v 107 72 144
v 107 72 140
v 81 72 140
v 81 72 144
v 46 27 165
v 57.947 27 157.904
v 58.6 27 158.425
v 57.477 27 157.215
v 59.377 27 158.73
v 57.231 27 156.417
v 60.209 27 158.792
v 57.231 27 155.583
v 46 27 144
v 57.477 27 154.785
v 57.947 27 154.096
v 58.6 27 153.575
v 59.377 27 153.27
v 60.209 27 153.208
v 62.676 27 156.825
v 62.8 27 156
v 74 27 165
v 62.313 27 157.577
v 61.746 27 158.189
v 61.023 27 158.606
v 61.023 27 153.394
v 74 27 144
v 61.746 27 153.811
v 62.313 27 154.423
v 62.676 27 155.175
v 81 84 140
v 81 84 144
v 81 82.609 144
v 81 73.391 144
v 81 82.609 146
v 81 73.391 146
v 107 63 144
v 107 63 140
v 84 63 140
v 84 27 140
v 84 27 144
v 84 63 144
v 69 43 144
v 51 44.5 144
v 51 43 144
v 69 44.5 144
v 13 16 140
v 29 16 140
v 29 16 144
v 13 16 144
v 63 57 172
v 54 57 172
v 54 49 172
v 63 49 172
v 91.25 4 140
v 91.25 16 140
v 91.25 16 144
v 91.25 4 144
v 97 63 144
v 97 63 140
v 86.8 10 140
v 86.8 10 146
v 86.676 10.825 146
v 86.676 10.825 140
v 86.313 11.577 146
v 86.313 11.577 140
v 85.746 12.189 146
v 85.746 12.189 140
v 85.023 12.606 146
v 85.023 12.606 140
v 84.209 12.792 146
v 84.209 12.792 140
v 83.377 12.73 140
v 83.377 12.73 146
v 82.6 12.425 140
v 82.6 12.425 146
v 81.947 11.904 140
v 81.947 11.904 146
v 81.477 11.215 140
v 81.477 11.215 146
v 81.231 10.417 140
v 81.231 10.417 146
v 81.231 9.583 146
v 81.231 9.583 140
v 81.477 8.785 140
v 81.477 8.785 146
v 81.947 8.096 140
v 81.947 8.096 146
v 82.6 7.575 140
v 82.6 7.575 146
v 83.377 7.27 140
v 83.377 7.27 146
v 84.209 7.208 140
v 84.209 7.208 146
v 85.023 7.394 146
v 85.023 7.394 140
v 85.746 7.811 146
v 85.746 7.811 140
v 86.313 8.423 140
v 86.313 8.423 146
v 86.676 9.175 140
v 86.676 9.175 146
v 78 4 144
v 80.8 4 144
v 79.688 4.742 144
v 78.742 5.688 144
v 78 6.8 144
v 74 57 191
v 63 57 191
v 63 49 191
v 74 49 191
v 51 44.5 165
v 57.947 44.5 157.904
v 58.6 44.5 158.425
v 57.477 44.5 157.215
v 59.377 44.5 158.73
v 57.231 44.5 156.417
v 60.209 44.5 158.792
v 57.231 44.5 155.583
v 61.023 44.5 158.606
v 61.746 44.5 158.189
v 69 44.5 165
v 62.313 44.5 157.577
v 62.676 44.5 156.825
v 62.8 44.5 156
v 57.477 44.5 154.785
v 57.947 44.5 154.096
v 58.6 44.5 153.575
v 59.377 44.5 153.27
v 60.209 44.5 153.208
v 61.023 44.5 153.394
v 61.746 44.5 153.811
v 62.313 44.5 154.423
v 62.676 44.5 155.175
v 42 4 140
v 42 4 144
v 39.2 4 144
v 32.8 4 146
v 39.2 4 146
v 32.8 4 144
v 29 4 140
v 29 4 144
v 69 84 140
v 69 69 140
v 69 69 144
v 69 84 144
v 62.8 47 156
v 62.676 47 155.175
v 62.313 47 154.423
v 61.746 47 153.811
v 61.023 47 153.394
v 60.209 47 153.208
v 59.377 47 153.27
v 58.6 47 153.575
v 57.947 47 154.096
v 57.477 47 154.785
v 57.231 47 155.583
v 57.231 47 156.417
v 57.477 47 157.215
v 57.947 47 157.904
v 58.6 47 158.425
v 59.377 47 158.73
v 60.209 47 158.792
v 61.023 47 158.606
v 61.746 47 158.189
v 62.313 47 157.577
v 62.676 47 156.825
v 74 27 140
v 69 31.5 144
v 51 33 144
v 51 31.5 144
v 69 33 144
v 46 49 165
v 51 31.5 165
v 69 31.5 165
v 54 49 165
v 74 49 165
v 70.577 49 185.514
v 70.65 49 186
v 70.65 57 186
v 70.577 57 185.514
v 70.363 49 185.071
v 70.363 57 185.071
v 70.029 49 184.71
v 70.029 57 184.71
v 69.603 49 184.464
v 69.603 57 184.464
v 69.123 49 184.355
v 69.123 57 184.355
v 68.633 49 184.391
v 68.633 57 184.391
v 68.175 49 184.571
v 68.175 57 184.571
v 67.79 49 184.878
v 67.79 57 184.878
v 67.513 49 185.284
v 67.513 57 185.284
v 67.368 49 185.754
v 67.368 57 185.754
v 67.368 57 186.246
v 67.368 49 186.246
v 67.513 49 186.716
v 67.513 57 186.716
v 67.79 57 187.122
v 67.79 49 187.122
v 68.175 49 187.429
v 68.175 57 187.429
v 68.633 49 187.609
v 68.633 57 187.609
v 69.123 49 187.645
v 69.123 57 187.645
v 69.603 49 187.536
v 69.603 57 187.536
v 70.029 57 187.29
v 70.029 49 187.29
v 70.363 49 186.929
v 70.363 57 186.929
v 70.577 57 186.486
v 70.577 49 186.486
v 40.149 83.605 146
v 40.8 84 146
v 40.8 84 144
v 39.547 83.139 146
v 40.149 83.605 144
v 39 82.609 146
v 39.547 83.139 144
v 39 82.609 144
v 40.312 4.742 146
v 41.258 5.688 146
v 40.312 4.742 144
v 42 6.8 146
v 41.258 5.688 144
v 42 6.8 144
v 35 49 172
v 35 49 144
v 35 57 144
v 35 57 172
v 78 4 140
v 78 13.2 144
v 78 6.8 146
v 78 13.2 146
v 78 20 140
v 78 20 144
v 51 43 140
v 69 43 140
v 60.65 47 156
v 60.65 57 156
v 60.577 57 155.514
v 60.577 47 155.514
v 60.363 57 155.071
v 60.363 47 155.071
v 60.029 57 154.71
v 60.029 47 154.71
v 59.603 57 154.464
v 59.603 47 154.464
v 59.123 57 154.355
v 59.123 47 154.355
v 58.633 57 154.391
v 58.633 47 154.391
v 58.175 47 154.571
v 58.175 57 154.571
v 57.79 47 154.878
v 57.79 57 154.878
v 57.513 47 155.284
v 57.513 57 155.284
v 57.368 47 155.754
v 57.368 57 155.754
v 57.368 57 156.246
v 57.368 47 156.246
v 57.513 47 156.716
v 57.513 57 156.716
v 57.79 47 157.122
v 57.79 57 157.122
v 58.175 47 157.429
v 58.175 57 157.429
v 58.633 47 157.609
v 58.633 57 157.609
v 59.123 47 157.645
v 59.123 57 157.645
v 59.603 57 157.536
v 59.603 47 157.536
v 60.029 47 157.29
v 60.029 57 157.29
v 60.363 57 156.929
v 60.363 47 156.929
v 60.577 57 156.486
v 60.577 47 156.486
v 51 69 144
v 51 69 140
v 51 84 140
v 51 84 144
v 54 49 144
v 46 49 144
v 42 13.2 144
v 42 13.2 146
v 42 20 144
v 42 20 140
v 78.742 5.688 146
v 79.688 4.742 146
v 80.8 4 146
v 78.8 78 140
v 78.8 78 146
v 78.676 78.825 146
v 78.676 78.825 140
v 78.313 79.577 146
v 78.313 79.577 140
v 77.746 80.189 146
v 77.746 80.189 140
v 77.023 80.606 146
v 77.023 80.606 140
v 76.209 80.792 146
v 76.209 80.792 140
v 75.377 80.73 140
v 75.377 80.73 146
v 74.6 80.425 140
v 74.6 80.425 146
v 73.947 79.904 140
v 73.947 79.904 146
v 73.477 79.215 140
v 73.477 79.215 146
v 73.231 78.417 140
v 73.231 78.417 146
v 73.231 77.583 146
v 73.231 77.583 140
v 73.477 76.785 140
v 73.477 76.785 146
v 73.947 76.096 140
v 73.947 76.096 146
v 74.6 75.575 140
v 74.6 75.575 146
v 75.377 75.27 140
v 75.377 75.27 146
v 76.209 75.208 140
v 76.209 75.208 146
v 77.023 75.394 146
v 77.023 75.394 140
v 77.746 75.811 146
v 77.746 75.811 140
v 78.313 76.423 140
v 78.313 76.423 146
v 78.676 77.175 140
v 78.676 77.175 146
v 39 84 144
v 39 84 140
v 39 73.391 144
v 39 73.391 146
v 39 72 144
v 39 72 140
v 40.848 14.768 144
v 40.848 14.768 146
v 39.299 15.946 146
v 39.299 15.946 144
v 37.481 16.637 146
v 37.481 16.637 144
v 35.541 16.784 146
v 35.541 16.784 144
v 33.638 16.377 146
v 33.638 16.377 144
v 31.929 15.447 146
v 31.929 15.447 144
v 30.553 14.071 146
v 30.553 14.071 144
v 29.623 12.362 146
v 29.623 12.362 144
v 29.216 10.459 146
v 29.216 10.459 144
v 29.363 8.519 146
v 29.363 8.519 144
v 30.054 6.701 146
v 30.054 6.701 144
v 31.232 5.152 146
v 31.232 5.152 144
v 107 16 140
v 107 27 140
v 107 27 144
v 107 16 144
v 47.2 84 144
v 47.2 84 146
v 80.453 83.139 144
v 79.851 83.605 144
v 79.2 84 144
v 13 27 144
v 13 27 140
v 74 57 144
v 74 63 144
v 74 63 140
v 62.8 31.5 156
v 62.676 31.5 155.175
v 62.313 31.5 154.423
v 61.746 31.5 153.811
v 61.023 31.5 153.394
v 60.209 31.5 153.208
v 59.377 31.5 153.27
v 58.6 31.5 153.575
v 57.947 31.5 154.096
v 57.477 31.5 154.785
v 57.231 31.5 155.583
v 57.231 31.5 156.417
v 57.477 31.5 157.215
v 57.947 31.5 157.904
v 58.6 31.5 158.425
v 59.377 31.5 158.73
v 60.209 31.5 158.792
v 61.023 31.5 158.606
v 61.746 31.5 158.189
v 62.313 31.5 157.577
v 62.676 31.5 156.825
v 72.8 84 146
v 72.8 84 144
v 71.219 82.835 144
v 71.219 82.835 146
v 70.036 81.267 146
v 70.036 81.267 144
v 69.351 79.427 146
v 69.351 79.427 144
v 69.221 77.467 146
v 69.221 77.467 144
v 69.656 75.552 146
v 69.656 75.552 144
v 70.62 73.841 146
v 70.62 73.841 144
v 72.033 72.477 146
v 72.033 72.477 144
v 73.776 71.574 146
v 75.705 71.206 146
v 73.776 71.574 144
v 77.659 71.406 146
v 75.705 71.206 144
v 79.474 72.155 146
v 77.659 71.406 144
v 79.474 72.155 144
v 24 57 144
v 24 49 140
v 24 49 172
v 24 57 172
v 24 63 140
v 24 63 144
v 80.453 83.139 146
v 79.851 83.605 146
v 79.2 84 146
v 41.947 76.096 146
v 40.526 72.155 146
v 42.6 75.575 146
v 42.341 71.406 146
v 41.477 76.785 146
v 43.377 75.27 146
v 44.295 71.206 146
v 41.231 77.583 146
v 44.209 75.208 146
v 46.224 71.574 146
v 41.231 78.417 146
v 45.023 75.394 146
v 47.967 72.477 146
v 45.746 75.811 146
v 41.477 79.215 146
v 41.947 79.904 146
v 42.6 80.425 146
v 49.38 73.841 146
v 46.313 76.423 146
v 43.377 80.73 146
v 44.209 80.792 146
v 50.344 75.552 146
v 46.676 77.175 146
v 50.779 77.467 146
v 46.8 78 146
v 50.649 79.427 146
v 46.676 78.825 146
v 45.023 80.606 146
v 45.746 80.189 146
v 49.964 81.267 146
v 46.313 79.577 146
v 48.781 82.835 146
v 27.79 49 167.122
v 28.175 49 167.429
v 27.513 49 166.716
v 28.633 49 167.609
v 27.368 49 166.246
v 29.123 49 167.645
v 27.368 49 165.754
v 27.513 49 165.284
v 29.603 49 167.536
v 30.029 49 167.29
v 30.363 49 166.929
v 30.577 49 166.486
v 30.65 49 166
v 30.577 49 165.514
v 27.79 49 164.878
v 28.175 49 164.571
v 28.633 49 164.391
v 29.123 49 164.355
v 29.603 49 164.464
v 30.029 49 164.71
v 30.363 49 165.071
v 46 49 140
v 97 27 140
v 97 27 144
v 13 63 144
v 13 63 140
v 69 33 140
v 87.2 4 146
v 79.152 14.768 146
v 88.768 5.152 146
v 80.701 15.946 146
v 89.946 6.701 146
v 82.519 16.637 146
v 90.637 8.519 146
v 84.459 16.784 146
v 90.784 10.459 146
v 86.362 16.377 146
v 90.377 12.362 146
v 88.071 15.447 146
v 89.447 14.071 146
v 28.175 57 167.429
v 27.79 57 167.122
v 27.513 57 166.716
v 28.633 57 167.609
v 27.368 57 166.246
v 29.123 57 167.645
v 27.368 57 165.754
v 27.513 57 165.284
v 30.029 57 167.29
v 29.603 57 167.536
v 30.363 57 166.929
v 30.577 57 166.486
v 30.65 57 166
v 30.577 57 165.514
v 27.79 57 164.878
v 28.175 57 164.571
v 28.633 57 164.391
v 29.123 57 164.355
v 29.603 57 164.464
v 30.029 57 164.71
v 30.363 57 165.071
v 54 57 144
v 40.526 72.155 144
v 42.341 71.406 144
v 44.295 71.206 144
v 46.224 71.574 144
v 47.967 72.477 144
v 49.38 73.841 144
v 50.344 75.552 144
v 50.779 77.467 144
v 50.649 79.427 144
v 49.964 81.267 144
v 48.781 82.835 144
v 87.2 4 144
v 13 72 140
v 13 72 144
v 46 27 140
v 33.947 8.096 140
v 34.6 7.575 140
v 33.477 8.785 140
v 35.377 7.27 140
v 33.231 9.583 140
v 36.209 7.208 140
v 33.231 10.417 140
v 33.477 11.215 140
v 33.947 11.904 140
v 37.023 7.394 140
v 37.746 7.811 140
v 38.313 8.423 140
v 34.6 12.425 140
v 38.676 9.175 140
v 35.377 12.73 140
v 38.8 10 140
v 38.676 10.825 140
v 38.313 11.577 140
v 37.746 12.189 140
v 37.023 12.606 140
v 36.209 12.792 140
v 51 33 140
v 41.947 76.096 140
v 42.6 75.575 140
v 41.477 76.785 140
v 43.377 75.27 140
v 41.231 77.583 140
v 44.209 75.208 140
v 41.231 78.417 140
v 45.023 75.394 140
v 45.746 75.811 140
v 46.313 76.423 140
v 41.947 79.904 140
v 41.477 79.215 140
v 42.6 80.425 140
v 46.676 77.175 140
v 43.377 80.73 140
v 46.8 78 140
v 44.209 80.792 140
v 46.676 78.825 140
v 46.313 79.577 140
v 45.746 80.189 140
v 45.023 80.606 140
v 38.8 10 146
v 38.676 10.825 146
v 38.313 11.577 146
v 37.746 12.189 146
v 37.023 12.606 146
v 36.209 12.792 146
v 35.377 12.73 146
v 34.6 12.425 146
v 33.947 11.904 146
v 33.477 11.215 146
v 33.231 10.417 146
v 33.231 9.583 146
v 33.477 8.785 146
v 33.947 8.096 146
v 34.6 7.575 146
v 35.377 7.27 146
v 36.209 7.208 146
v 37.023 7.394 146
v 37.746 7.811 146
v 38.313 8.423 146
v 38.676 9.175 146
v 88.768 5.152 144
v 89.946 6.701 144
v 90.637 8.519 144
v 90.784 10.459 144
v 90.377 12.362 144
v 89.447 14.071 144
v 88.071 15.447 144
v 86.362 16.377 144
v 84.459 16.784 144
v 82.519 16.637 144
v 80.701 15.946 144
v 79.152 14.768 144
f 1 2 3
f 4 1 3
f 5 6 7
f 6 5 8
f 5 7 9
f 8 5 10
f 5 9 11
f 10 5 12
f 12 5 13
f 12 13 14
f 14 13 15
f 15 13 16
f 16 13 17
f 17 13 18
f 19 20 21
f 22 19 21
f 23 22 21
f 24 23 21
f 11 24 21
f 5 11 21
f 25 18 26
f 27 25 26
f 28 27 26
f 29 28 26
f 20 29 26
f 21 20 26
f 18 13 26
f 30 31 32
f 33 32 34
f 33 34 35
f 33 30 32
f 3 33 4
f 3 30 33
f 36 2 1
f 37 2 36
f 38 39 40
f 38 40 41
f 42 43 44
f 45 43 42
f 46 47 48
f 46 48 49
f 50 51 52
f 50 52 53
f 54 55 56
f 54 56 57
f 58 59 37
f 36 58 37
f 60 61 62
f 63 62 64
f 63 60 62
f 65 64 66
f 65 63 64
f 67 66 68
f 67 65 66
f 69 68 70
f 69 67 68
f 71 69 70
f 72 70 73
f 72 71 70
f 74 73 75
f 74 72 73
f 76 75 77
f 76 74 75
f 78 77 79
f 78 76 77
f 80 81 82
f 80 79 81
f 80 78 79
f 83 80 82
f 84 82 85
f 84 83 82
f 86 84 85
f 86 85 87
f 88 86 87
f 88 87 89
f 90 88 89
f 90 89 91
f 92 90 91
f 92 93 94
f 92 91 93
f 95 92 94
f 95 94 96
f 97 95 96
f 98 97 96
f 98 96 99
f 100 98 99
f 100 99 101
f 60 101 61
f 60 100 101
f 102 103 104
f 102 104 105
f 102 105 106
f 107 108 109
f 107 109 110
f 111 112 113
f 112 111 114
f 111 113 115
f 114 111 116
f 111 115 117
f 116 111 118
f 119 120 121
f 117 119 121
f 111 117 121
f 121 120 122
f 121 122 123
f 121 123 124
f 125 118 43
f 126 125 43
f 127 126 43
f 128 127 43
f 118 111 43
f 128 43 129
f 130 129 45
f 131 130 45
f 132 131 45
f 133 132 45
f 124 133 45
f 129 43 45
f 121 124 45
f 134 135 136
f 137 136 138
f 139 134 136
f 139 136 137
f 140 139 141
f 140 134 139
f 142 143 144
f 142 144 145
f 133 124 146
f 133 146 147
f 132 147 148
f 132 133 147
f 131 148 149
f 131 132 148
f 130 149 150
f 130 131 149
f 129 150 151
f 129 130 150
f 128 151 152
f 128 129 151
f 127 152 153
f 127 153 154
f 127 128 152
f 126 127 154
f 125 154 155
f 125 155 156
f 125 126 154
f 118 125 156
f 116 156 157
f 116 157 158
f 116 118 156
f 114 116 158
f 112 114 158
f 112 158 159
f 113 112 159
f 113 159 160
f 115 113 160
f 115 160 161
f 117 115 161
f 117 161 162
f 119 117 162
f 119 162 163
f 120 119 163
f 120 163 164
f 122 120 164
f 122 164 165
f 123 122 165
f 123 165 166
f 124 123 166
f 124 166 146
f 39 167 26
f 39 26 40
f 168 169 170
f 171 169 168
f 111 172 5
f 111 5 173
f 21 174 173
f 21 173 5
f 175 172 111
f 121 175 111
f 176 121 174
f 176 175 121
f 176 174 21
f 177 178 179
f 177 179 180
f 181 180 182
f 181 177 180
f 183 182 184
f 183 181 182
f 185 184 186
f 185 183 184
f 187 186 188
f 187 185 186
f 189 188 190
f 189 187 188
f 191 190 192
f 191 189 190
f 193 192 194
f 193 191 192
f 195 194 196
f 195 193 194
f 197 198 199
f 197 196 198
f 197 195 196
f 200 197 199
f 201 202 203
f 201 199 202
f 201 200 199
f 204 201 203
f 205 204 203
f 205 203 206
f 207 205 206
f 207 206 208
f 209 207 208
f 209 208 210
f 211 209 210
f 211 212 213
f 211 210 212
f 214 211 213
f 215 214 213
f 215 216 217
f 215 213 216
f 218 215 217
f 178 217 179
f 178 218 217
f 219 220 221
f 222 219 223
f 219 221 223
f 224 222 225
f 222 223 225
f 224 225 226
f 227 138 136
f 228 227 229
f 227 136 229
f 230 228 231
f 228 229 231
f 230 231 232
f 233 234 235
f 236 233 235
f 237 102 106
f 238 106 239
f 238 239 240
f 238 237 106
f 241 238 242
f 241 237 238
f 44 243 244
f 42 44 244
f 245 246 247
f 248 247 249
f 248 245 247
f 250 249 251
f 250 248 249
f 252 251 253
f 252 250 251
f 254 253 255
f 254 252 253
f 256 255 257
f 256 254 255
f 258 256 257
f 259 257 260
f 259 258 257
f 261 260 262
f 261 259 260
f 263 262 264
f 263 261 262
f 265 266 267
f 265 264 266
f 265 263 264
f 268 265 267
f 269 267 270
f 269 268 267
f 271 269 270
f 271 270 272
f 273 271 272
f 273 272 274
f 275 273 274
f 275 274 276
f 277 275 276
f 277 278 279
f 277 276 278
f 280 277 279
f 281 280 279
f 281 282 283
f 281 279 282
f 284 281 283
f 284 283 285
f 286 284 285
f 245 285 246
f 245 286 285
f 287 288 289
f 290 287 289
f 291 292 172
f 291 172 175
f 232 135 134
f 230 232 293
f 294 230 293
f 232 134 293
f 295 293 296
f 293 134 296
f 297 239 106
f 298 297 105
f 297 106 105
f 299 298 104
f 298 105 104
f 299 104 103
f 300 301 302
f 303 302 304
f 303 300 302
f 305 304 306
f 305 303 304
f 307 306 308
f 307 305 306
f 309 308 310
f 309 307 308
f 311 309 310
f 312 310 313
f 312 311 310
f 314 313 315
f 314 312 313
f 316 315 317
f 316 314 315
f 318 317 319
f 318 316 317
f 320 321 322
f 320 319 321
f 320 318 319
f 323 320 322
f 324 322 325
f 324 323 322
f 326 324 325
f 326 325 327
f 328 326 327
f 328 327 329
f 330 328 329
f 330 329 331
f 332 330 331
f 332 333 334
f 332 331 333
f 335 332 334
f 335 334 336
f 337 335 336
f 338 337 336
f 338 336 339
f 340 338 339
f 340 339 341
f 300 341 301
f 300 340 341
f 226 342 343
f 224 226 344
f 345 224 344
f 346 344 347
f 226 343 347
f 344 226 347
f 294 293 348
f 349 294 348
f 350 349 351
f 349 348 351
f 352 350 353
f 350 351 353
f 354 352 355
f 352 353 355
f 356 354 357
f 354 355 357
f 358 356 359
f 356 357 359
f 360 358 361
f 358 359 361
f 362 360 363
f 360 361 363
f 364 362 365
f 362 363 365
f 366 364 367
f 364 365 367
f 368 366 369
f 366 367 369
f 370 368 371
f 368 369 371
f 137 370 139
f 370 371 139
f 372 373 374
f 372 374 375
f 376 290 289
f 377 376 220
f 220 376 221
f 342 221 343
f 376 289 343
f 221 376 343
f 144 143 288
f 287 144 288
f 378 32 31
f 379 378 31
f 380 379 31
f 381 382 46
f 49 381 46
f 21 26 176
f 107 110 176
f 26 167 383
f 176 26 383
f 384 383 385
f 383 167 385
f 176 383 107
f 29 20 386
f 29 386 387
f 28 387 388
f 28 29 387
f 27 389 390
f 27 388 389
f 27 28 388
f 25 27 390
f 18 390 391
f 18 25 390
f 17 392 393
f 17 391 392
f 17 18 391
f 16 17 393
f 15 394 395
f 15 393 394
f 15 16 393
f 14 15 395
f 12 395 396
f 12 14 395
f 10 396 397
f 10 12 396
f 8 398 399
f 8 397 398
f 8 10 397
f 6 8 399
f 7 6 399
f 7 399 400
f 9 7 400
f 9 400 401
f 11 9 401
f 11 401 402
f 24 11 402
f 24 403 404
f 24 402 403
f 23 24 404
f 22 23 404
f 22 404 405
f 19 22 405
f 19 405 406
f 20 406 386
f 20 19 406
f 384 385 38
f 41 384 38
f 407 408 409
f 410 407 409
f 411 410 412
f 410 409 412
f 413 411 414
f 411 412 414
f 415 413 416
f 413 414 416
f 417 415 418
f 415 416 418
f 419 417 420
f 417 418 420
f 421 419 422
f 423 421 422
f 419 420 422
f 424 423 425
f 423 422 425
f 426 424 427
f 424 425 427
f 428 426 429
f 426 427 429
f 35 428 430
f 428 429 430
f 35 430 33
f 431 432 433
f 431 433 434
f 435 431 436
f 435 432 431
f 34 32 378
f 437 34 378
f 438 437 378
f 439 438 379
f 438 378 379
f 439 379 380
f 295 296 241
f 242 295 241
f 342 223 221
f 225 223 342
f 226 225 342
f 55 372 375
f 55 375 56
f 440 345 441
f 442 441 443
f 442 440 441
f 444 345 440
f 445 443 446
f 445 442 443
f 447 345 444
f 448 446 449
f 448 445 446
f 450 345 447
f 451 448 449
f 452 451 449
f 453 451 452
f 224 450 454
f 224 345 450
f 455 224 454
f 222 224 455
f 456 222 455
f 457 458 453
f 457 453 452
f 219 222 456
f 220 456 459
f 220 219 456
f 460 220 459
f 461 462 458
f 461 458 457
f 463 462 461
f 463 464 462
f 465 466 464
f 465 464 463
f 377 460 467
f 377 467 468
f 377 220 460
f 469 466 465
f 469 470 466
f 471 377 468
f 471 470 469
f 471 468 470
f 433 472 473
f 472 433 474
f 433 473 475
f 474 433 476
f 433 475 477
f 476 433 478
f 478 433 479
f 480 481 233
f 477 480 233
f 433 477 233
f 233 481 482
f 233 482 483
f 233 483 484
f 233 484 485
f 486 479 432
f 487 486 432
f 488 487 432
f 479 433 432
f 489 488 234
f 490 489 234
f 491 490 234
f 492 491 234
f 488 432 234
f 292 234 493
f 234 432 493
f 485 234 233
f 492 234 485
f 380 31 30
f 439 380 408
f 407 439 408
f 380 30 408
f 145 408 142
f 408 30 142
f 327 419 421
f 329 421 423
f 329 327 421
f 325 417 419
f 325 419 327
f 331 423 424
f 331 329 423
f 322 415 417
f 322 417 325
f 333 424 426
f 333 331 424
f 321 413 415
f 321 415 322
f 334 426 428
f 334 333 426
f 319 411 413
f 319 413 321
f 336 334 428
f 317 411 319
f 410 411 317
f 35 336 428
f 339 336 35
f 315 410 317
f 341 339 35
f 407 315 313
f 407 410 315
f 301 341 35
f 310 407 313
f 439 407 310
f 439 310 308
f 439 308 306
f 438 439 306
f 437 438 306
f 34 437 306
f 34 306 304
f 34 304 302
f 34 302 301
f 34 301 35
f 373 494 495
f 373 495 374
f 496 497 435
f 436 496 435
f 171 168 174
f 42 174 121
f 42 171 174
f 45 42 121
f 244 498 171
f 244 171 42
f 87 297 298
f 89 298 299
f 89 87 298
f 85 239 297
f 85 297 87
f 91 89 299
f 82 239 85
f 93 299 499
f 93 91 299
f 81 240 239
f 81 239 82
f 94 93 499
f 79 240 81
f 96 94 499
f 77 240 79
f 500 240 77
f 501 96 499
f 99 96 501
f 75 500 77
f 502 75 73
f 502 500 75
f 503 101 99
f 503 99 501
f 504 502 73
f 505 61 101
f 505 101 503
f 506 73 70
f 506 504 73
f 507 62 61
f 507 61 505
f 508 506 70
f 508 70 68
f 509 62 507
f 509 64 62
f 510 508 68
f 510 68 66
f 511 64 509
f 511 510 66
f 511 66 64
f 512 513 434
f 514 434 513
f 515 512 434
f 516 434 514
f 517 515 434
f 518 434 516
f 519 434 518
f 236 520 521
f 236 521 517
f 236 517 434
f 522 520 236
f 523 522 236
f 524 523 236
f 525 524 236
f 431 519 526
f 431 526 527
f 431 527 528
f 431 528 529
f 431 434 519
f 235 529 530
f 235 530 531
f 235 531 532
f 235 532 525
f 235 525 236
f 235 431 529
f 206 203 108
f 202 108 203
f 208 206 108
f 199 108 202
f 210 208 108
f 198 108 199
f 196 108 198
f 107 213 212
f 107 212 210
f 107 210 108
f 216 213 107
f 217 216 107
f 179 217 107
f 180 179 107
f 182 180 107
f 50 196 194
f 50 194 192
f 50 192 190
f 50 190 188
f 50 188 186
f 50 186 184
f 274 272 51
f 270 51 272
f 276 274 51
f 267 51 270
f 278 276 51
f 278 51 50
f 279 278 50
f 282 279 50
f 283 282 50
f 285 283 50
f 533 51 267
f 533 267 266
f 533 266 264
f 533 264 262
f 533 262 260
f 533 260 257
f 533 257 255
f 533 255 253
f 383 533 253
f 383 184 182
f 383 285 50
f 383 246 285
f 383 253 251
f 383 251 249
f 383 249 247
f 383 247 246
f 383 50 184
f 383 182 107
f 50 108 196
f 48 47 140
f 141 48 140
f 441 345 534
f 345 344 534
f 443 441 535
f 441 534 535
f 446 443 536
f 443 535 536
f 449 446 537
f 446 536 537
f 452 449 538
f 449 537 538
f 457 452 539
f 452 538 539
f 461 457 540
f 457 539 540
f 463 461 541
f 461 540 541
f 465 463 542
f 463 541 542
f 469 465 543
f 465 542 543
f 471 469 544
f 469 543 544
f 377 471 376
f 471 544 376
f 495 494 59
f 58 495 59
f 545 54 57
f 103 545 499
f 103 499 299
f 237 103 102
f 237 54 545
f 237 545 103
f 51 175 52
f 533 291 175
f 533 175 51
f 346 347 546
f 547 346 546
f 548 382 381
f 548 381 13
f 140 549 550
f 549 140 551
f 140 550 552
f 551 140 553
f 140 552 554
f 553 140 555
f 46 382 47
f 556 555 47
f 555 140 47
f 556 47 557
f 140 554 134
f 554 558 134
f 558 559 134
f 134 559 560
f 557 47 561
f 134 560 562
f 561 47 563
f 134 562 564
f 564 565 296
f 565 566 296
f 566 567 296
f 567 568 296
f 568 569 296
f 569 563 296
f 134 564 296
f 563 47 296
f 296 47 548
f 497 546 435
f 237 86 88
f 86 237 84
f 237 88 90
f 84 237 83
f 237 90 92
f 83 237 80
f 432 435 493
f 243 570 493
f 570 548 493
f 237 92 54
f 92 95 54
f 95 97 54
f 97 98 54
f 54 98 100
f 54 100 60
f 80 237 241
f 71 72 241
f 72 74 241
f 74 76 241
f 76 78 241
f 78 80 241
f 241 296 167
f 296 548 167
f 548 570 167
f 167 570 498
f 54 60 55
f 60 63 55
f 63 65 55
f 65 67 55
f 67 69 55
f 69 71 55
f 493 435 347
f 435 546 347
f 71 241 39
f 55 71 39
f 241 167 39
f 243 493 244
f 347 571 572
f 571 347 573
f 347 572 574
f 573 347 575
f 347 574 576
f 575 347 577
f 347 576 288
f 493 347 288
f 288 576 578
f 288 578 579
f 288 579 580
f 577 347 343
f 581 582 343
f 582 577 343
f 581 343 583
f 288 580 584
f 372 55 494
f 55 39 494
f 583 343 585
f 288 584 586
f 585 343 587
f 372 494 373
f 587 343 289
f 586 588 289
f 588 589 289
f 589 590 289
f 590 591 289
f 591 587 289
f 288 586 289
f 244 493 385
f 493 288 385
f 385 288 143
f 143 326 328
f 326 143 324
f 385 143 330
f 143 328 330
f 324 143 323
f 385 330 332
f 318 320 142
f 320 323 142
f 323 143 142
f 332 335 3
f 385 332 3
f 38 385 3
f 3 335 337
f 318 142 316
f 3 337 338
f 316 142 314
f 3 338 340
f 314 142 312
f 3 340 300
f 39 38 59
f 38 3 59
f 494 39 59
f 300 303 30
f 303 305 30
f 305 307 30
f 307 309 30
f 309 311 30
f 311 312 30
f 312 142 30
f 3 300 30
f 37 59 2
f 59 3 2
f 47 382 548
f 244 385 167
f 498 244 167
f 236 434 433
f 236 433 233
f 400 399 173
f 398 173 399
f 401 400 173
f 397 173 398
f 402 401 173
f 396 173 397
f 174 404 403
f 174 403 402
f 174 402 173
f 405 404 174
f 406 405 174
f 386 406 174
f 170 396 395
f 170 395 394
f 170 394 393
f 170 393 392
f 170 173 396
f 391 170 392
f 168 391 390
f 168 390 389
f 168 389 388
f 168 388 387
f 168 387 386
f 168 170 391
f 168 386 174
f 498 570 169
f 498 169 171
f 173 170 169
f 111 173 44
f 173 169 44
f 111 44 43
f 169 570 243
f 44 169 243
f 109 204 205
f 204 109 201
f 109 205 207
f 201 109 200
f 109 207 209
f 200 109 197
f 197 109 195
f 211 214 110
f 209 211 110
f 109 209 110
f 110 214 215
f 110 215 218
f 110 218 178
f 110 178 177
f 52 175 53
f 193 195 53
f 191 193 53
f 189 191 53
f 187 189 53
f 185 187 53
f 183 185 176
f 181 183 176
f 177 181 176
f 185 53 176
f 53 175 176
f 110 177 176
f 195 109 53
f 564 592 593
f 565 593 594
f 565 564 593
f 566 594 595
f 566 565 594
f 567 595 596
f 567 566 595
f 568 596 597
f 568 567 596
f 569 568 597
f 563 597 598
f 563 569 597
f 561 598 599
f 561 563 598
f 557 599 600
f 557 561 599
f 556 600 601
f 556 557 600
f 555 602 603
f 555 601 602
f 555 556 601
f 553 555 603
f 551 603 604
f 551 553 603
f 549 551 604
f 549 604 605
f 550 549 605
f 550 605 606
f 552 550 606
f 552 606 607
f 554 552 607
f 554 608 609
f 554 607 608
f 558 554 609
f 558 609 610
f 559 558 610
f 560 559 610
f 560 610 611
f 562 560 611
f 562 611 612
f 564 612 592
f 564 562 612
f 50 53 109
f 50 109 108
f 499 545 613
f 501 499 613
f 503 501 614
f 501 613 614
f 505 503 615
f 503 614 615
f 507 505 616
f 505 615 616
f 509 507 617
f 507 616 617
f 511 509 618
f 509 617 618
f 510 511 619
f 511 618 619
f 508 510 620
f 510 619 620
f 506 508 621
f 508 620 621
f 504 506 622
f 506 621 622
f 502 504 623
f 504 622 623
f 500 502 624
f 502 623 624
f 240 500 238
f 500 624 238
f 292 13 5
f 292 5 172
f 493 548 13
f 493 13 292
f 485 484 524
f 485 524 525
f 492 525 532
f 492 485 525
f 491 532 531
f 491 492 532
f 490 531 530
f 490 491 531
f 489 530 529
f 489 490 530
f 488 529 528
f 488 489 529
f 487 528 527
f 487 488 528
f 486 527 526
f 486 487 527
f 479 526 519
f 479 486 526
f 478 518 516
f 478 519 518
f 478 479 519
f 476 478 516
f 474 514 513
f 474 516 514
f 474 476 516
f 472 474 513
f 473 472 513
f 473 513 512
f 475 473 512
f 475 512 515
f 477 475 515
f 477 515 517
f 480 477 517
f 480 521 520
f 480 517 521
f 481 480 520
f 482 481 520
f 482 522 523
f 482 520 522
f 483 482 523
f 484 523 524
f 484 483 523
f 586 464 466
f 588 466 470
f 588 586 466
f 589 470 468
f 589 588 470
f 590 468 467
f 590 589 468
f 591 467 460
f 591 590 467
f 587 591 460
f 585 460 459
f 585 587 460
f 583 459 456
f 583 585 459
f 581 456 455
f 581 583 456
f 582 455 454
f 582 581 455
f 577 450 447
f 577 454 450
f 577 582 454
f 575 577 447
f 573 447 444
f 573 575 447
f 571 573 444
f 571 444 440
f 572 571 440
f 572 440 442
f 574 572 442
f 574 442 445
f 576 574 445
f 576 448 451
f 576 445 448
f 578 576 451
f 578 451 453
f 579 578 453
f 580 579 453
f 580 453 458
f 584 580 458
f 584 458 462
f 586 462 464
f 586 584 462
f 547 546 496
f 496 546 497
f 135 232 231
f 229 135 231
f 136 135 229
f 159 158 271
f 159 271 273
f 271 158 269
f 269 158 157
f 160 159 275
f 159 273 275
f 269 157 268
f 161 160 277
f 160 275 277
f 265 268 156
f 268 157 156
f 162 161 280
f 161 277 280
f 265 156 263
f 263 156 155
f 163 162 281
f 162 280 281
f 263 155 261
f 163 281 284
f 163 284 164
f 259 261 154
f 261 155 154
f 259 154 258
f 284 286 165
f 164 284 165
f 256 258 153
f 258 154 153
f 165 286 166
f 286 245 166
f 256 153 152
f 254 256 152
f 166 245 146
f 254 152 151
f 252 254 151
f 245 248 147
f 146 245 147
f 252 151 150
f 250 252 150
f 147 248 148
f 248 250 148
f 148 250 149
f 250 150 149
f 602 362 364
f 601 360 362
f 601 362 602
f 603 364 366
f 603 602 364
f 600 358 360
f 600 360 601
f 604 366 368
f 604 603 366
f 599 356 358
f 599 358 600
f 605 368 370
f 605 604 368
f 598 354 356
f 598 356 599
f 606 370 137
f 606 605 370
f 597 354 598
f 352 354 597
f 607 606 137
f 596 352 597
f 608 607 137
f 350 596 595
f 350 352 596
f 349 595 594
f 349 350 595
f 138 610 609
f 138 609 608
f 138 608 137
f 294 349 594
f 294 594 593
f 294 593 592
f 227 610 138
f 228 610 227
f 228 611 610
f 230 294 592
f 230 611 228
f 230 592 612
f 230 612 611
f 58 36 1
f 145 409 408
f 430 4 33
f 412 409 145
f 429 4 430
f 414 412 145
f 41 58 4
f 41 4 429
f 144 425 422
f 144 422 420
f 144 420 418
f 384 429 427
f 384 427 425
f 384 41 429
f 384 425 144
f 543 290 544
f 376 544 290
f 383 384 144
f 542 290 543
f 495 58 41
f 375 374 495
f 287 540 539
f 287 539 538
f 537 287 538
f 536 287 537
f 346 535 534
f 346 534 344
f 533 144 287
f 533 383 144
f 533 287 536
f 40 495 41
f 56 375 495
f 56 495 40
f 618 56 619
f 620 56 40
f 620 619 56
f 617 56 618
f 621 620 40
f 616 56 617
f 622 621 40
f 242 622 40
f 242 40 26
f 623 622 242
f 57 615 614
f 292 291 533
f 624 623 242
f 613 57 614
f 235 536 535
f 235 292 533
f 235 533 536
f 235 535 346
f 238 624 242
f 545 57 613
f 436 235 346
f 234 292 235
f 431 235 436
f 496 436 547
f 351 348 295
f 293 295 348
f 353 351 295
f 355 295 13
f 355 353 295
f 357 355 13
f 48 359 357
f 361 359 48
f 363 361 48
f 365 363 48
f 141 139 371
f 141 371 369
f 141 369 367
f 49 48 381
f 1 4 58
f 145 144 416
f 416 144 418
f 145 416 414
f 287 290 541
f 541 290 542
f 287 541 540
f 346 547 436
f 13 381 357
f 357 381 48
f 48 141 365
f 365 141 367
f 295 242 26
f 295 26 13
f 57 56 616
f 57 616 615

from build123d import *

# Parameters (mm, degrees)
BOX096_W                    = 10
BOX096_H                    = 36
BOX096_DEPTH                = 10
BOX094_W                    = 94
BOX094_H                    = 8
BOX094_DEPTH                = 10
BOX095_W                    = 94
BOX095_H                    = 8
BOX095_DEPTH                = 10
BOX092_W                    = 94
BOX092_H                    = 8
BOX092_DEPTH                = 10
BOX093_W                    = 94
BOX093_H                    = 8
BOX093_DEPTH                = 10
CYLINDER112_R               = 2.8
CYLINDER112_DEPTH           = 10
CYLINDER113_R               = 2.8
CYLINDER113_DEPTH           = 10
CYLINDER114_R               = 2.8
CYLINDER114_DEPTH           = 10
CYLINDER111_R               = 2.8
CYLINDER111_DEPTH           = 10
BOX089_W                    = 11
BOX089_H                    = 6
BOX089_DEPTH                = 10
BOX088_W                    = 19
BOX088_H                    = 8
BOX088_DEPTH                = 51
CYLINDER109_R               = 1.65
CYLINDER109_DEPTH           = 50
CYLINDER110_R               = 1.65
CYLINDER110_DEPTH           = 50
CYLINDER108_R               = 1.65
CYLINDER108_DEPTH           = 50
BOX085_W                    = 15
BOX085_H                    = 18
BOX085_DEPTH                = 10
BOX080_W                    = 33
BOX080_H                    = 22
BOX080_DEPTH                = 10
BOX083_W                    = 18
BOX083_H                    = 13
BOX083_DEPTH                = 25
BOX082_W                    = 36
BOX082_H                    = 19
BOX082_DEPTH                = 10
BOX081_W                    = 10
BOX081_H                    = 36
BOX081_DEPTH                = 10
BOX073_W                    = 18
BOX073_H                    = 10
BOX073_DEPTH                = 25
CYLINDER_R                  = 2.8
CYLINDER_DEPTH              = 50
BOX087_W                    = 50
BOX087_H                    = 8
BOX087_DEPTH                = 51
BOX091_W                    = 11
BOX091_H                    = 8
BOX091_DEPTH                = 10
BOX084_W                    = 50
BOX084_H                    = 8
BOX084_DEPTH                = 51
BOX086_W                    = 28
BOX086_H                    = 22
BOX086_DEPTH                = 25
CYLINDER107_R               = 1
CYLINDER107_DEPTH           = 10
CYLINDER103_R               = 2.25
CYLINDER103_DEPTH           = 10
CYLINDER104_R               = 2.25
CYLINDER104_DEPTH           = 10
CYLINDER106_R               = 2
CYLINDER106_DEPTH           = 10
CYLINDER105_R               = 2.25
CYLINDER105_DEPTH           = 10
BOX063_W                    = 26
BOX063_H                    = 12
BOX063_DEPTH                = 4
BOX061_W                    = 26
BOX061_H                    = 12
BOX061_DEPTH                = 4
BOX062_W                    = 26
BOX062_H                    = 12
BOX062_DEPTH                = 4
BOX064_W                    = 26
BOX064_H                    = 12
BOX064_DEPTH                = 4
BOX060_W                    = 94
BOX060_H                    = 80
BOX060_DEPTH                = 4
CUT020_PLACEMENT_ANGLE      = 180
CYLINDER116_R               = 6.8
CYLINDER116_DEPTH           = 6
CYLINDER117_R               = 6.8
CYLINDER117_DEPTH           = 6
CYLINDER118_R               = 6.8
CYLINDER118_DEPTH           = 6
CYLINDER115_R               = 6.8
CYLINDER115_DEPTH           = 6
CYLINDER115_PLACEMENT_ANGLE = 60


with BuildPart() as cube053:
    # Box096 → Box096 (new body)
    with BuildSketch(Plane(origin=(97, 27, 140), x_dir=(1, 0, 0), z_dir=(0, 0, 1))):
        with Locations((5, 18)):
            Rectangle(BOX096_W, BOX096_H)
    extrude(amount=BOX096_DEPTH)


with BuildPart() as cube051:
    # Box094 → Box094 (new body)
    with BuildSketch(Plane(origin=(89, 72, 140), x_dir=(0, 1, 0), z_dir=(0, 0, 1))):
        with Locations((47, 4)):
            Rectangle(BOX094_W, BOX094_H)
    extrude(amount=BOX094_DEPTH)


with BuildPart() as cube052:
    # Box095 → Box095 (new body)
    with BuildSketch(Plane(origin=(39, 72, 140), x_dir=(0, 1, 0), z_dir=(0, 0, 1))):
        with Locations((47, 4)):
            Rectangle(BOX095_W, BOX095_H)
    extrude(amount=BOX095_DEPTH)


with BuildPart() as cube049:
    # Box092 → Box092 (new body)
    with BuildSketch(Plane(origin=(13, -4, 140), x_dir=(1, 0, 0), z_dir=(0, 0, 1))):
        with Locations((47, 4)):
            Rectangle(BOX092_W, BOX092_H)
    extrude(amount=BOX092_DEPTH)


with BuildPart() as fusion130:
    # Box093 → Box093 (new body)
    with BuildSketch(Plane(origin=(13, 84, 140), x_dir=(1, 0, 0), z_dir=(0, 0, 1))):
        with Locations((47, 4)):
            Rectangle(BOX093_W, BOX093_H)
    extrude(amount=BOX093_DEPTH)

    # Fusion130: union Cube051, Cube052, Cube049
    add(cube051.part)
    add(cube052.part)
    add(cube049.part)


with BuildPart() as m4heatsetcut001:
    # Cylinder112 → Cylinder112 (new body)
    with BuildSketch(Plane(origin=(84, 10, 140), x_dir=(1, 0, 0), z_dir=(0, 0, 1))):
        Circle(CYLINDER112_R)
    extrude(amount=CYLINDER112_DEPTH)


with BuildPart() as m4heatsetcut002:
    # Cylinder113 → Cylinder113 (new body)
    with BuildSketch(Plane(origin=(76, 78, 140), x_dir=(1, 0, 0), z_dir=(0, 0, 1))):
        Circle(CYLINDER113_R)
    extrude(amount=CYLINDER113_DEPTH)


with BuildPart() as m4heatsetcut003:
    # Cylinder114 → Cylinder114 (new body)
    with BuildSketch(Plane(origin=(44, 78, 140), x_dir=(1, 0, 0), z_dir=(0, 0, 1))):
        Circle(CYLINDER114_R)
    extrude(amount=CYLINDER114_DEPTH)


with BuildPart() as heatsetcuts:
    # Cylinder111 → Cylinder111 (new body)
    with BuildSketch(Plane(origin=(36, 10, 140), x_dir=(1, 0, 0), z_dir=(0, 0, 1))):
        Circle(CYLINDER111_R)
    extrude(amount=CYLINDER111_DEPTH)

    # Fusion126: union m4HeatSetCut001, m4HeatSetCut002, m4HeatSetCut003
    add(m4heatsetcut001.part)
    add(m4heatsetcut002.part)
    add(m4heatsetcut003.part)


with BuildPart() as cube046:
    # Box089 → Box089 (new body)
    with BuildSketch(Plane(origin=(13, 57, 140), x_dir=(1, 0, 0), z_dir=(0, 0, 1))):
        with Locations((5.5, 3)):
            Rectangle(BOX089_W, BOX089_H)
    extrude(amount=BOX089_DEPTH)


with BuildPart() as cube045:
    # Box088 → Box088 (new body)
    with BuildSketch(Plane(origin=(35, 49, 144), x_dir=(1, 0, 0), z_dir=(0, 0, 1))):
        with Locations((9.5, 4)):
            Rectangle(BOX088_W, BOX088_H)
    extrude(amount=BOX088_DEPTH)


with BuildPart() as cylinder111:
    # Cylinder109 → Cylinder109 (new body)
    with BuildSketch(Plane(origin=(40, 17, 166), x_dir=(1, 0, 0), z_dir=(0, 1, 0))):
        Circle(CYLINDER109_R)
    extrude(amount=CYLINDER109_DEPTH)


with BuildPart() as cylinder112:
    # Cylinder110 → Cylinder110 (new body)
    with BuildSketch(Plane(origin=(70, 17, 156), x_dir=(1, 0, 0), z_dir=(0, 1, 0))):
        Circle(CYLINDER110_R)
    extrude(amount=CYLINDER110_DEPTH)


with BuildPart() as m2cuts:
    # Cylinder108 → Cylinder108 (new body)
    with BuildSketch(Plane(origin=(80, 17, 186), x_dir=(1, 0, 0), z_dir=(0, 1, 0))):
        Circle(CYLINDER108_R)
    extrude(amount=CYLINDER108_DEPTH)

    # Fusion: union Cylinder111, Cylinder112
    add(cylinder111.part)
    add(cylinder112.part)


with BuildPart() as m2cuts_1:
    # Fusion placement: moved
    add(m2cuts.part.moved(Location((-11, 30, 0))))


with BuildPart() as cube043:
    # Box085 → Box085 (new body)
    with BuildSketch(Plane(origin=(69, 69, 140), x_dir=(0, 1, 0), z_dir=(0, 0, 1))):
        with Locations((7.5, 9)):
            Rectangle(BOX085_W, BOX085_H)
    extrude(amount=BOX085_DEPTH)


with BuildPart() as cube038:
    # Box080 → Box080 (new body)
    with BuildSketch(Plane(origin=(13, 27, 140), x_dir=(1, 0, 0), z_dir=(0, 0, 1))):
        with Locations((16.5, 11)):
            Rectangle(BOX080_W, BOX080_H)
    extrude(amount=BOX080_DEPTH)


with BuildPart() as cube041:
    # Box083 → Box083 (new body)
    with BuildSketch(Plane(origin=(51, 31.5, 144), x_dir=(1, 0, 0), z_dir=(0, 0, 1))):
        with Locations((9, 6.5)):
            Rectangle(BOX083_W, BOX083_H)
    extrude(amount=BOX083_DEPTH)


with BuildPart() as cube040:
    # Box082 → Box082 (new body)
    with BuildSketch(Plane(origin=(42, 1, 140), x_dir=(1, 0, 0), z_dir=(0, 0, 1))):
        with Locations((18, 9.5)):
            Rectangle(BOX082_W, BOX082_H)
    extrude(amount=BOX082_DEPTH)


with BuildPart() as cube039:
    # Box081 → Box081 (new body)
    with BuildSketch(Plane(origin=(74, 27, 140), x_dir=(1, 0, 0), z_dir=(0, 0, 1))):
        with Locations((5, 18)):
            Rectangle(BOX081_W, BOX081_H)
    extrude(amount=BOX081_DEPTH)


with BuildPart() as basespinecut:
    # Box073 → Box073 (new body)
    with BuildSketch(Plane(origin=(51, 33, 140), x_dir=(1, 0, 0), z_dir=(0, 0, 1))):
        with Locations((9, 5)):
            Rectangle(BOX073_W, BOX073_H)
    extrude(amount=BOX073_DEPTH)


with BuildPart() as cylinder:
    # Cylinder → Cylinder (new body)
    with BuildSketch(Plane(origin=(60, -3, 156), x_dir=(1, 0, 0), z_dir=(0, 1, 0))):
        Circle(CYLINDER_R)
    extrude(amount=CYLINDER_DEPTH)


with BuildPart() as cuts:
    # Box087 → Box087 (new body)
    with BuildSketch(Plane(origin=(13, 49, 172), x_dir=(1, 0, 0), z_dir=(0, 0, 1))):
        with Locations((25, 4)):
            Rectangle(BOX087_W, BOX087_H)
    extrude(amount=BOX087_DEPTH)

    # Fusion125: union Cube045, m2Cuts, Cube043, Cube038, Cube041, Cube040, Cube039, baseSpineCut, Cylinder
    add(cube045.part)
    add(m2cuts_1.part)
    add(cube043.part)
    add(cube038.part)
    add(cube041.part)
    add(cube040.part)
    add(cube039.part)
    add(basespinecut.part)
    add(cylinder.part)


with BuildPart() as cuts003:
    # Box091 → Box091 (new body)
    with BuildSketch(Plane(origin=(13, 49, 140), x_dir=(1, 0, 0), z_dir=(0, 0, 1))):
        with Locations((5.5, 4)):
            Rectangle(BOX091_W, BOX091_H)
    extrude(amount=BOX091_DEPTH)

    # Fusion127: union heatSetCuts, Cube046, cuts
    add(heatsetcuts.part)
    add(cube046.part)
    add(cuts.part)

    # Fusion131: union Fusion130
    add(fusion130.part)

    # Fusion132: union Cube053
    add(cube053.part)


with BuildPart() as cube042:
    # Box084 → Box084 (new body)
    with BuildSketch(Plane(origin=(24, 49, 140), x_dir=(1, 0, 0), z_dir=(0, 0, 1))):
        with Locations((25, 4)):
            Rectangle(BOX084_W, BOX084_H)
    extrude(amount=BOX084_DEPTH)


with BuildPart() as basespinein:
    # Box086 → Box086 (new body)
    with BuildSketch(Plane(origin=(46, 27, 140), x_dir=(1, 0, 0), z_dir=(0, 0, 1))):
        with Locations((14, 11)):
            Rectangle(BOX086_W, BOX086_H)
    extrude(amount=BOX086_DEPTH)


with BuildPart() as cylinder109:
    # Cylinder107 → Cylinder107 (new body)
    with BuildSketch(Plane.XY):
        Circle(CYLINDER107_R)
    extrude(amount=CYLINDER107_DEPTH)


with BuildPart() as cylinder107:
    # Cylinder103 → Cylinder103 (new body)
    with BuildSketch(Plane(origin=(63, 3, 0), x_dir=(1, 0, 0), z_dir=(0, 0, 1))):
        Circle(CYLINDER103_R)
    extrude(amount=CYLINDER103_DEPTH)


with BuildPart() as cylinder103:
    # Cylinder104 → Cylinder104 (new body)
    with BuildSketch(Plane(origin=(71, 71, 0), x_dir=(1, 0, 0), z_dir=(0, 0, 1))):
        Circle(CYLINDER104_R)
    extrude(amount=CYLINDER104_DEPTH)


with BuildPart() as cylinder104:
    # Cylinder106 → Cylinder106 (new body)
    with BuildSketch(Plane(origin=(23, 71, 0), x_dir=(1, 0, 0), z_dir=(0, 0, 1))):
        Circle(CYLINDER106_R)
    extrude(amount=CYLINDER106_DEPTH)


with BuildPart() as screwins001:
    # Cylinder105 → Cylinder105 (new body)
    with BuildSketch(Plane(origin=(31, 3, 0), x_dir=(1, 0, 0), z_dir=(0, 0, 1))):
        Circle(CYLINDER105_R)
    extrude(amount=CYLINDER105_DEPTH)

    # Fusion123: union Cylinder109, Cylinder107, Cylinder103, Cylinder104
    add(cylinder109.part)
    add(cylinder107.part)
    add(cylinder103.part)
    add(cylinder104.part)


with BuildPart() as screwins001_1:
    # Fusion123 placement: moved
    add(screwins001.part.moved(Location((0, 3, 0))))


with BuildPart() as base004:
    # Box063 → Box063 (new body)
    with BuildSketch(Plane(origin=(78, 68, 0), x_dir=(1, 0, 0), z_dir=(0, 0, 1))):
        with Locations((13, 6)):
            Rectangle(BOX063_W, BOX063_H)
    extrude(amount=BOX063_DEPTH)


with BuildPart() as base002:
    # Box061 → Box061 (new body)
    with BuildSketch(Plane.XY):
        with Locations((13, 6)):
            Rectangle(BOX061_W, BOX061_H)
    extrude(amount=BOX061_DEPTH)


with BuildPart() as base003:
    # Box062 → Box062 (new body)
    with BuildSketch(Plane(origin=(68, 0, 0), x_dir=(1, 0, 0), z_dir=(0, 0, 1))):
        with Locations((13, 6)):
            Rectangle(BOX062_W, BOX062_H)
    extrude(amount=BOX062_DEPTH)


with BuildPart() as fusion122:
    # Box064 → Box064 (new body)
    with BuildSketch(Plane(origin=(-10.25, 68, 0), x_dir=(1, 0, 0), z_dir=(0, 0, 1))):
        with Locations((13, 6)):
            Rectangle(BOX064_W, BOX064_H)
    extrude(amount=BOX064_DEPTH)

    # Fusion122: union base004, base002, base003
    add(base004.part)
    add(base002.part)
    add(base003.part)


with BuildPart() as base:
    # Box060 → Box060 (new body)
    with BuildSketch(Plane.XY):
        with Locations((47, 40)):
            Rectangle(BOX060_W, BOX060_H)
    extrude(amount=BOX060_DEPTH)

    # Cut019: cut Fusion122
    add(fusion122.part, mode=Mode.SUBTRACT)

    # Cut020: cut screwIns001
    add(screwins001_1.part, mode=Mode.SUBTRACT)


with BuildPart() as base_1:
    # Cut020 placement: moved
    add(base.part.moved(Location((107, 84, 140))).rotate(Axis((107, 84, 140), (0, 0, 1)), CUT020_PLACEMENT_ANGLE))

    # Fusion124: union Cube042, baseSpineIn
    add(cube042.part)
    add(basespinein.part)


with BuildPart() as m4heatsetcut005:
    # Cylinder116 → Cylinder116 (new body)
    with BuildSketch(Plane(origin=(84, 10, 140), x_dir=(1, 0, 0), z_dir=(0, 0, 1))):
        Circle(CYLINDER116_R)
    extrude(amount=CYLINDER116_DEPTH)


with BuildPart() as m4heatsetcut006:
    # Cylinder117 → Cylinder117 (new body)
    with BuildSketch(Plane(origin=(76, 78, 140), x_dir=(1, 0, 0), z_dir=(0, 0, 1))):
        Circle(CYLINDER117_R)
    extrude(amount=CYLINDER117_DEPTH)


with BuildPart() as m4heatsetcut007:
    # Cylinder118 → Cylinder118 (new body)
    with BuildSketch(Plane(origin=(44, 78, 140), x_dir=(1, 0, 0), z_dir=(0, 0, 1))):
        Circle(CYLINDER118_R)
    extrude(amount=CYLINDER118_DEPTH)


with BuildPart() as base007:
    # Cylinder115 → Cylinder115 (new body)
    with BuildSketch(Plane.XY):
        Circle(CYLINDER115_R)
    extrude(amount=CYLINDER115_DEPTH)


with BuildPart() as base007_1:
    # Cylinder115 placement: moved
    add(base007.part.moved(Location((36, 10, 140))).rotate(Axis((36, 10, 140), (0, 0, -1)), CYLINDER115_PLACEMENT_ANGLE))

    # Fusion128: union m4HeatSetCut005, m4HeatSetCut006, m4HeatSetCut007
    add(m4heatsetcut005.part)
    add(m4heatsetcut006.part)
    add(m4heatsetcut007.part)

    # Fusion129: union base
    add(base_1.part)

    # Cut: cut cuts003
    add(cuts003.part, mode=Mode.SUBTRACT)


solid = base007_1.part
